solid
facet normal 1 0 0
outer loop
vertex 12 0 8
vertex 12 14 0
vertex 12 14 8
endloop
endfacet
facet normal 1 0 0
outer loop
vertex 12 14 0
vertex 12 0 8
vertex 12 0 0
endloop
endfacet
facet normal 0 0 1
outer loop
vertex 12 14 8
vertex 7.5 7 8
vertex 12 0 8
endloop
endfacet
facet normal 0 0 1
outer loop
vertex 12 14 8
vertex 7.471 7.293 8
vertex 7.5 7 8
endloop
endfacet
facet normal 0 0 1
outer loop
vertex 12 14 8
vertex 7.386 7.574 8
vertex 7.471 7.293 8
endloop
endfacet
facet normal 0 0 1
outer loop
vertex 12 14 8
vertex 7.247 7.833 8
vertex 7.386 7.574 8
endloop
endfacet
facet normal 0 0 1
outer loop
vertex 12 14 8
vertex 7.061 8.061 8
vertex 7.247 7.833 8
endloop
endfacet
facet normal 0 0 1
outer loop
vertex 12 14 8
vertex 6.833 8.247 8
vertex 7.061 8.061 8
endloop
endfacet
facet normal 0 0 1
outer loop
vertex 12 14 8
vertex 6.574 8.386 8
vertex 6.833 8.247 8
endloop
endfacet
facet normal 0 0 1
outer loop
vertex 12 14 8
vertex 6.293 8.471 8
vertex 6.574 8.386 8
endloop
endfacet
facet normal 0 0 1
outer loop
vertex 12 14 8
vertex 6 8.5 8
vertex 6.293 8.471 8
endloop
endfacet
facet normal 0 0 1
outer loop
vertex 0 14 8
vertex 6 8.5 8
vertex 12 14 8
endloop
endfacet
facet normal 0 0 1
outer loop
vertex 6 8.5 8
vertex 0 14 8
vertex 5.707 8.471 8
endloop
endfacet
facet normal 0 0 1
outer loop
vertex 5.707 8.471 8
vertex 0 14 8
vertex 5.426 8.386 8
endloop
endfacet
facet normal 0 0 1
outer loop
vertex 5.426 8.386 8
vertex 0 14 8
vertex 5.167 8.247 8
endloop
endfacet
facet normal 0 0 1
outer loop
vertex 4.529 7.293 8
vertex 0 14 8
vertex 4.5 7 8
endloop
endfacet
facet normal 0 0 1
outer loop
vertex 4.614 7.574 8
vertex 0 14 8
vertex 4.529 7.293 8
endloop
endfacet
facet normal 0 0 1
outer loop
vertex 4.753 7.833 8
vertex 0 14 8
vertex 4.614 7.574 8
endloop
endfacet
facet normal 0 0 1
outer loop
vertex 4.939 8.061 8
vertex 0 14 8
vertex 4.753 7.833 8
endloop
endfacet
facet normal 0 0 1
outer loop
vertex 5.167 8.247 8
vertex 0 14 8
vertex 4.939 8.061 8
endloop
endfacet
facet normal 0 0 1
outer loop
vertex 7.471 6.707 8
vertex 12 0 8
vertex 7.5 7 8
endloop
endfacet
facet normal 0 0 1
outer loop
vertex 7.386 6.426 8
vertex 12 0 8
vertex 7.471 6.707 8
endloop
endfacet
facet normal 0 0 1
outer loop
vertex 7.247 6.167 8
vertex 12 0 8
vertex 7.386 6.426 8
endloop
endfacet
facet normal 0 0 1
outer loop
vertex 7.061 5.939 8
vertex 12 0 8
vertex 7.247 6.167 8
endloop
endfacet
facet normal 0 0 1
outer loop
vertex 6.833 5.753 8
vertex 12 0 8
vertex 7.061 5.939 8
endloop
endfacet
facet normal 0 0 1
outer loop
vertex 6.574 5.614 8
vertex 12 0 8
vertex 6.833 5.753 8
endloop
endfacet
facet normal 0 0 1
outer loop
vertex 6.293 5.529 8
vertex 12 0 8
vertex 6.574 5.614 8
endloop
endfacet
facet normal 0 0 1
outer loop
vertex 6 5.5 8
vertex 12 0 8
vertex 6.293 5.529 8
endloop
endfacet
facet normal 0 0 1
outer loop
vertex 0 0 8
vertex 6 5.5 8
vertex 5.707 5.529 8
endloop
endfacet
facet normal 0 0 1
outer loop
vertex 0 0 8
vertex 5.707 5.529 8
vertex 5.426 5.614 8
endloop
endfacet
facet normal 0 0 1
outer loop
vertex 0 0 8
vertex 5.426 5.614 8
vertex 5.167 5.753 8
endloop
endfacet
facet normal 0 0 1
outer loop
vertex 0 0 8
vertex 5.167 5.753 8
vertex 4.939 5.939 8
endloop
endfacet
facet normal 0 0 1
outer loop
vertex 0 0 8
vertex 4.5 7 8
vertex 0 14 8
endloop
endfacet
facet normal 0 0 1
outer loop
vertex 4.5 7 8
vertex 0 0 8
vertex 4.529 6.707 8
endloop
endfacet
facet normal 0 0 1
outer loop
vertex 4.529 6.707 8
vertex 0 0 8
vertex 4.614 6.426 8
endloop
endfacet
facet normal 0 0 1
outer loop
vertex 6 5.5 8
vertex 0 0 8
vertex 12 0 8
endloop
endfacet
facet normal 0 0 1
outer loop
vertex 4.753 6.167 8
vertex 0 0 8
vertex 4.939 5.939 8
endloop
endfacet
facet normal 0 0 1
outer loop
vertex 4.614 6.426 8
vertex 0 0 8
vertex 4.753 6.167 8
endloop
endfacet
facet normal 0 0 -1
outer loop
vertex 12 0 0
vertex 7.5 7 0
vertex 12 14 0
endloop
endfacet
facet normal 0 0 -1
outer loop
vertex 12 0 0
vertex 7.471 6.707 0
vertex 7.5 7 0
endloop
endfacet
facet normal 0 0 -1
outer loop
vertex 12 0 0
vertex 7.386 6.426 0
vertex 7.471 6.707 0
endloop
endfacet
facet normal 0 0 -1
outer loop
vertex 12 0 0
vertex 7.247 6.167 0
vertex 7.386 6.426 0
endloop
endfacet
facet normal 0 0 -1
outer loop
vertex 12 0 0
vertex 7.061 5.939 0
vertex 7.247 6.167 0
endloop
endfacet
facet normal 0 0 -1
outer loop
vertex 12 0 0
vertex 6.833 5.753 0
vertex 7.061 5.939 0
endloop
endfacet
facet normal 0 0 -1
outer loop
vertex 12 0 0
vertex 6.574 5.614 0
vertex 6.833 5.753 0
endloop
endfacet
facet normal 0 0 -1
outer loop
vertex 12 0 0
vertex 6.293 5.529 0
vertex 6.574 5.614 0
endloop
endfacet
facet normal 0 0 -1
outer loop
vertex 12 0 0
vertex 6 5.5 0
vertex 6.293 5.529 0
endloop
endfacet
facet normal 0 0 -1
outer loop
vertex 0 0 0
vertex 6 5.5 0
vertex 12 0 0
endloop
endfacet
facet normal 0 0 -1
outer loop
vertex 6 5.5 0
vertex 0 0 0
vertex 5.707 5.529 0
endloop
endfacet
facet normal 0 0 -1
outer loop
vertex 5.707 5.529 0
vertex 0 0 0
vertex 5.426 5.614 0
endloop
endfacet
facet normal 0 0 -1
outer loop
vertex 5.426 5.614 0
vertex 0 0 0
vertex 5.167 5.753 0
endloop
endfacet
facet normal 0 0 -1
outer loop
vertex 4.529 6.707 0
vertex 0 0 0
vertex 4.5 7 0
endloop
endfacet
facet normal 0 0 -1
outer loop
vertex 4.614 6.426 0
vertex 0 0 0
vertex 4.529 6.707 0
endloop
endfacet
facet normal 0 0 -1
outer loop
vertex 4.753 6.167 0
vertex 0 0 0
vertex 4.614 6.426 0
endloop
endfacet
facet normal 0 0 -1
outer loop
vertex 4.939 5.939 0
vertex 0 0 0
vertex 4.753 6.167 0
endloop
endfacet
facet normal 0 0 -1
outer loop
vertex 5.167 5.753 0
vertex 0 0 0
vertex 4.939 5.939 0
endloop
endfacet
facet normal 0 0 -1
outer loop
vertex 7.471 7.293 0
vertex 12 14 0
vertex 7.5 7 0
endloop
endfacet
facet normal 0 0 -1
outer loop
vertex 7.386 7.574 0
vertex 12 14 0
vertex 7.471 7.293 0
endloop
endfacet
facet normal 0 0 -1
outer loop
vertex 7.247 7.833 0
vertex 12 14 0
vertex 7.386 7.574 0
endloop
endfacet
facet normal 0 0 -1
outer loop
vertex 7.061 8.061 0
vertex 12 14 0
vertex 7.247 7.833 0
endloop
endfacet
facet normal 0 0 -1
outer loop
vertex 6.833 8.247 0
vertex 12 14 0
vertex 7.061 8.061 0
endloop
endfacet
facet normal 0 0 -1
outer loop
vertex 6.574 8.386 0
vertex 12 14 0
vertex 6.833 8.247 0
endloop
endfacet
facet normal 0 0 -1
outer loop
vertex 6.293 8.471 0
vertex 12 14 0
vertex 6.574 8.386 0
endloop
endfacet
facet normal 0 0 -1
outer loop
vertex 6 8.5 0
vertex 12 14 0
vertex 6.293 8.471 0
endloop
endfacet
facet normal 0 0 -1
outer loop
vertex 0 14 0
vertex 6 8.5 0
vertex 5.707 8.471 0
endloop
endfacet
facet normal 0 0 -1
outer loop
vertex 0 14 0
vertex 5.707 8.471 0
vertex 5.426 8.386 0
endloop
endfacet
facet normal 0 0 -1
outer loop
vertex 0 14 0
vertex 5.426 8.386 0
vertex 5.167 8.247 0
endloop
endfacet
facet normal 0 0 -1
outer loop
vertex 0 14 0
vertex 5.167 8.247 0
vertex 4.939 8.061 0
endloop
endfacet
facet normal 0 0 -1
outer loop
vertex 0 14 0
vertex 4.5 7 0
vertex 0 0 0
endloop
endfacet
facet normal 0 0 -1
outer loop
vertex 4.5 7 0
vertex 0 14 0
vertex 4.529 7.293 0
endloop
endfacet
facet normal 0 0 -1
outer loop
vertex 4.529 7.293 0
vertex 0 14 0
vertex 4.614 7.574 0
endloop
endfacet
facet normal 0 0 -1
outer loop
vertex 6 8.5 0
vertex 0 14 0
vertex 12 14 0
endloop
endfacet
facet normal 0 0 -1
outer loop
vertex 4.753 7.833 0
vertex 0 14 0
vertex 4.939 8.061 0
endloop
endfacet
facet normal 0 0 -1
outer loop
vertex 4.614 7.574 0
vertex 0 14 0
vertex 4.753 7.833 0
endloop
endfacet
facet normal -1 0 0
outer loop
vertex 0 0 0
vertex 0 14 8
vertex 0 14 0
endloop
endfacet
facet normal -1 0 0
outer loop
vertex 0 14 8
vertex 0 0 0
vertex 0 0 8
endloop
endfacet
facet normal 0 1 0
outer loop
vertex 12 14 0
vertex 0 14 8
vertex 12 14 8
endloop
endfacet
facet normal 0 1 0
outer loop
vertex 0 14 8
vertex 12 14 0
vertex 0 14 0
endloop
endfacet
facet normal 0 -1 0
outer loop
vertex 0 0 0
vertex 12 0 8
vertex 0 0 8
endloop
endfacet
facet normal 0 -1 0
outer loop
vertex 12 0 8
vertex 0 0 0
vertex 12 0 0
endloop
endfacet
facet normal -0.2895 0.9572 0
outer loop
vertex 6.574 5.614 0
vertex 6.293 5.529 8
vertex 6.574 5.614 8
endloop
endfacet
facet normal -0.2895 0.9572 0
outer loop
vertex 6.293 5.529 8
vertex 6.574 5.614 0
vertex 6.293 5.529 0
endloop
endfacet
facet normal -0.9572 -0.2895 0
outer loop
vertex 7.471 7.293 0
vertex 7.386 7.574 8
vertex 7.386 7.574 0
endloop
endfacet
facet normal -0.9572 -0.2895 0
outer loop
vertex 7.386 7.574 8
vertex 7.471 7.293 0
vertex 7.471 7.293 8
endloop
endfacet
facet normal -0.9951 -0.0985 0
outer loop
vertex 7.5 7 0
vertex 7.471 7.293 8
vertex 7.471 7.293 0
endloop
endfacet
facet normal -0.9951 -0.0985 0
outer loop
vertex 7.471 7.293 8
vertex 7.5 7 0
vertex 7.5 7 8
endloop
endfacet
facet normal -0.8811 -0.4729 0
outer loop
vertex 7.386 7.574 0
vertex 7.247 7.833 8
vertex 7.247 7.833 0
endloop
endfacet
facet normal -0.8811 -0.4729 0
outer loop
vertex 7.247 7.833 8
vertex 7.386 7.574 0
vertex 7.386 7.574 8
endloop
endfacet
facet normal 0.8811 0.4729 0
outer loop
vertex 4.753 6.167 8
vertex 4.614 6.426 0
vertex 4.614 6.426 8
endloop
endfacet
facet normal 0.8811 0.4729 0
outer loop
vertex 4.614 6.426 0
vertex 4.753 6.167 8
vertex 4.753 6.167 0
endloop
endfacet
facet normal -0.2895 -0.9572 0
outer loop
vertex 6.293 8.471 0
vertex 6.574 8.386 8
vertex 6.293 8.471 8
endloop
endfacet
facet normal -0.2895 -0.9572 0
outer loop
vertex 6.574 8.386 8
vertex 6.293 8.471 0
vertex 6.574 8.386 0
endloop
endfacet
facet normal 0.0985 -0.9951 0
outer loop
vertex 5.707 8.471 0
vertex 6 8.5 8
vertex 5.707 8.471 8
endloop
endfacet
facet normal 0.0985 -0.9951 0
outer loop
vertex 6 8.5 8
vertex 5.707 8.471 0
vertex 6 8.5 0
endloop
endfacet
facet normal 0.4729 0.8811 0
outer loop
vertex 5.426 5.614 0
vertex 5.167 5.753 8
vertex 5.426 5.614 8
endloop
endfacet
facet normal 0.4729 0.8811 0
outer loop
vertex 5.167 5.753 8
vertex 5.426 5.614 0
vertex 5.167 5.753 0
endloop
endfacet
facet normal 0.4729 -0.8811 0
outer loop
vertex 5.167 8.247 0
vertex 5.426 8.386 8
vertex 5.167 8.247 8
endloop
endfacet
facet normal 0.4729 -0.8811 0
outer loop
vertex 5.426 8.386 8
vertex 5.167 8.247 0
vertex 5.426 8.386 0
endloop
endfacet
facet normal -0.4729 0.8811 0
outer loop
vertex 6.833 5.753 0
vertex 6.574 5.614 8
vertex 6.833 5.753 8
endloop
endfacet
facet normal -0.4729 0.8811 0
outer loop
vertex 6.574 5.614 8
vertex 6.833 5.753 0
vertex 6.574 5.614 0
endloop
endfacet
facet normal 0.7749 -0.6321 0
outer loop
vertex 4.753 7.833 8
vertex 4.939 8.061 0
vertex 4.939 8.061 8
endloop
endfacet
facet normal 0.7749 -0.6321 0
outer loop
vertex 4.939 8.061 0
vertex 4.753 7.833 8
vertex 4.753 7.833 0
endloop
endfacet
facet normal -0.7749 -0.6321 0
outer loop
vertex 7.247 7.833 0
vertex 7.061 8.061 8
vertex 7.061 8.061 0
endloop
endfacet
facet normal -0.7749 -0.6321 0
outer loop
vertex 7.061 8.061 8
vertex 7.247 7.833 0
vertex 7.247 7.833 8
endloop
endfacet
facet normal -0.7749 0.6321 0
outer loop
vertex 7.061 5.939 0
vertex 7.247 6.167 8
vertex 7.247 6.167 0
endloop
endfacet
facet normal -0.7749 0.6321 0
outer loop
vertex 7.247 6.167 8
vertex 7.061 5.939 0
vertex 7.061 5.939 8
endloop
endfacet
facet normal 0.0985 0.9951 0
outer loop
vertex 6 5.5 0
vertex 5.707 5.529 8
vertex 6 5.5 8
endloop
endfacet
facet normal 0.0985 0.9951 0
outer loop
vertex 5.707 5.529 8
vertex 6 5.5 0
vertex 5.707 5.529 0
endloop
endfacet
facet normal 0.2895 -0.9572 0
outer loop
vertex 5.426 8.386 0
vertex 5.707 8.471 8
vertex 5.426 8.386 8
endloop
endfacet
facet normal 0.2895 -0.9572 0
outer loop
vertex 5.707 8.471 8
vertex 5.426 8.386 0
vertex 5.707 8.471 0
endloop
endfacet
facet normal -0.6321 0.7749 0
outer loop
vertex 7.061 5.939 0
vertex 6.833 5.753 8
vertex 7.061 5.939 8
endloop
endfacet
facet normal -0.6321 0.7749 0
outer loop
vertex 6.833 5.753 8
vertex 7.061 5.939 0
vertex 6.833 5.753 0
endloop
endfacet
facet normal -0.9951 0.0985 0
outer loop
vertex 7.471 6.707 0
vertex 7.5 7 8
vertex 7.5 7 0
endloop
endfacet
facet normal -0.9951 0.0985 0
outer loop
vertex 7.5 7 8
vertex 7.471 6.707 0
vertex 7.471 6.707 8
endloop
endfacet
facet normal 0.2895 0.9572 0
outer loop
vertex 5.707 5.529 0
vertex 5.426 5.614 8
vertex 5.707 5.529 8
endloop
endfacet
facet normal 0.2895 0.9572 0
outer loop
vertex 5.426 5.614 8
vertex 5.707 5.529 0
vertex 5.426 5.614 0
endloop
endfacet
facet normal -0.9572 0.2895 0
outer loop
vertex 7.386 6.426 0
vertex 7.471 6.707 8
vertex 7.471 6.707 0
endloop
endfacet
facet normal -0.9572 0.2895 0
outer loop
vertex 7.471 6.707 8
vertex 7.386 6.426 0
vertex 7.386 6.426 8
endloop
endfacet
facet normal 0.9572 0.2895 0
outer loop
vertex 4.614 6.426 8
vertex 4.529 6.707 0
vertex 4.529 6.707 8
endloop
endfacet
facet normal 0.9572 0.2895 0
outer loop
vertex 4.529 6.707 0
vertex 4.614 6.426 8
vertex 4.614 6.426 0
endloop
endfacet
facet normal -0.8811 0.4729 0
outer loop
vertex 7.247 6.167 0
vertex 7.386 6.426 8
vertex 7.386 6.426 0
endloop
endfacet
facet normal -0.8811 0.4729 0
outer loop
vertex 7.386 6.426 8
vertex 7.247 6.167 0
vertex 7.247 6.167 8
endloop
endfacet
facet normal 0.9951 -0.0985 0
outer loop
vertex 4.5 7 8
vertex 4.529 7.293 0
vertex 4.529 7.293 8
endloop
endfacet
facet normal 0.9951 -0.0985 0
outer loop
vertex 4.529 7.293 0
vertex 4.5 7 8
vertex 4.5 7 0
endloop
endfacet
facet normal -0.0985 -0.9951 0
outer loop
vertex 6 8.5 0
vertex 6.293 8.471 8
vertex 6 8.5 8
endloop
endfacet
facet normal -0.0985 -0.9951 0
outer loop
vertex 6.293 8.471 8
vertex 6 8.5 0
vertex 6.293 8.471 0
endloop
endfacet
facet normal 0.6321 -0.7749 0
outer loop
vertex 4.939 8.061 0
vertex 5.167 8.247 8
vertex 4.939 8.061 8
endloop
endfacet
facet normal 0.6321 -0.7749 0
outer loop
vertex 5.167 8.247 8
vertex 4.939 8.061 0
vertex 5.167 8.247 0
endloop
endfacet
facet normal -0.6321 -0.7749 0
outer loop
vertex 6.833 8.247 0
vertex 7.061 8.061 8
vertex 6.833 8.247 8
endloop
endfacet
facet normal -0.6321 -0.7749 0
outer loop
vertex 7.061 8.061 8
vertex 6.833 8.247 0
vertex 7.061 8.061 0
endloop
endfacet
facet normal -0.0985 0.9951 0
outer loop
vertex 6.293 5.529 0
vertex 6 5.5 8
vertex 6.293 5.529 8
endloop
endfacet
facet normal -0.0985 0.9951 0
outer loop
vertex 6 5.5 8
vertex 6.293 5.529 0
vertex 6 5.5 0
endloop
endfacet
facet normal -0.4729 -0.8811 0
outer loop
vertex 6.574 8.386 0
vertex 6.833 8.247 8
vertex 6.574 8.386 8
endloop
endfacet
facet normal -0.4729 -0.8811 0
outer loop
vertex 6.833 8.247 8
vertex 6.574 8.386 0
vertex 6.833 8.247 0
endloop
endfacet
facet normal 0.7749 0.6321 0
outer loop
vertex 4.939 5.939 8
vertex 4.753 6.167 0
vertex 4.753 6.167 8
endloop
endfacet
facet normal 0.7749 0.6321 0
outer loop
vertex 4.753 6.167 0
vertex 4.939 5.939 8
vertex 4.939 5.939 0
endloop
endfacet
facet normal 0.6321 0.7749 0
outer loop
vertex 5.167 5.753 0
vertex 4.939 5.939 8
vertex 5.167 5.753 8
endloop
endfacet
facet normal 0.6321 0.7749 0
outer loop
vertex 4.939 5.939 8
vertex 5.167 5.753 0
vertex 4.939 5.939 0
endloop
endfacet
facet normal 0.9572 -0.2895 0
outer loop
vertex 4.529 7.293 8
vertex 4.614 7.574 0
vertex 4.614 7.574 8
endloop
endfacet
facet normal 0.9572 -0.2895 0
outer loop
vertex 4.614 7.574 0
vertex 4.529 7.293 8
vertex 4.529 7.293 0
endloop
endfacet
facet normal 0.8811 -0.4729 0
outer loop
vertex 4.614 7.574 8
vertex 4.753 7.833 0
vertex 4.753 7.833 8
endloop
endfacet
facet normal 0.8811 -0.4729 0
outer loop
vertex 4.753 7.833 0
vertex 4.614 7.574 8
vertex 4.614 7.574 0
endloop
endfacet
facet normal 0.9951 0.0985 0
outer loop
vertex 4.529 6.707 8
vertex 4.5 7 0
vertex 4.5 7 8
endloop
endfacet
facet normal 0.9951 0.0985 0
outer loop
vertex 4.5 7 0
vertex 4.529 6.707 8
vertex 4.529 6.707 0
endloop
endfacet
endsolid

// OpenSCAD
$fn = 32;

// ----------------------------------------------------------------------
// Micro pad: drilled pad, 5-20 mm class
// ----------------------------------------------------------------------

// --- parameters (mm) ---
pad_l = 12;               // pad length, X
pad_w = 14;               // pad width, Y
pad_t = 8;                // pad thickness, Z
hole_d = 3;               // through hole diameter

difference() {
  cube([pad_l, pad_w, pad_t]);
  translate([pad_l / 2, pad_w / 2, -1])
    cylinder(h = pad_t + 2, d = hole_d);
}
